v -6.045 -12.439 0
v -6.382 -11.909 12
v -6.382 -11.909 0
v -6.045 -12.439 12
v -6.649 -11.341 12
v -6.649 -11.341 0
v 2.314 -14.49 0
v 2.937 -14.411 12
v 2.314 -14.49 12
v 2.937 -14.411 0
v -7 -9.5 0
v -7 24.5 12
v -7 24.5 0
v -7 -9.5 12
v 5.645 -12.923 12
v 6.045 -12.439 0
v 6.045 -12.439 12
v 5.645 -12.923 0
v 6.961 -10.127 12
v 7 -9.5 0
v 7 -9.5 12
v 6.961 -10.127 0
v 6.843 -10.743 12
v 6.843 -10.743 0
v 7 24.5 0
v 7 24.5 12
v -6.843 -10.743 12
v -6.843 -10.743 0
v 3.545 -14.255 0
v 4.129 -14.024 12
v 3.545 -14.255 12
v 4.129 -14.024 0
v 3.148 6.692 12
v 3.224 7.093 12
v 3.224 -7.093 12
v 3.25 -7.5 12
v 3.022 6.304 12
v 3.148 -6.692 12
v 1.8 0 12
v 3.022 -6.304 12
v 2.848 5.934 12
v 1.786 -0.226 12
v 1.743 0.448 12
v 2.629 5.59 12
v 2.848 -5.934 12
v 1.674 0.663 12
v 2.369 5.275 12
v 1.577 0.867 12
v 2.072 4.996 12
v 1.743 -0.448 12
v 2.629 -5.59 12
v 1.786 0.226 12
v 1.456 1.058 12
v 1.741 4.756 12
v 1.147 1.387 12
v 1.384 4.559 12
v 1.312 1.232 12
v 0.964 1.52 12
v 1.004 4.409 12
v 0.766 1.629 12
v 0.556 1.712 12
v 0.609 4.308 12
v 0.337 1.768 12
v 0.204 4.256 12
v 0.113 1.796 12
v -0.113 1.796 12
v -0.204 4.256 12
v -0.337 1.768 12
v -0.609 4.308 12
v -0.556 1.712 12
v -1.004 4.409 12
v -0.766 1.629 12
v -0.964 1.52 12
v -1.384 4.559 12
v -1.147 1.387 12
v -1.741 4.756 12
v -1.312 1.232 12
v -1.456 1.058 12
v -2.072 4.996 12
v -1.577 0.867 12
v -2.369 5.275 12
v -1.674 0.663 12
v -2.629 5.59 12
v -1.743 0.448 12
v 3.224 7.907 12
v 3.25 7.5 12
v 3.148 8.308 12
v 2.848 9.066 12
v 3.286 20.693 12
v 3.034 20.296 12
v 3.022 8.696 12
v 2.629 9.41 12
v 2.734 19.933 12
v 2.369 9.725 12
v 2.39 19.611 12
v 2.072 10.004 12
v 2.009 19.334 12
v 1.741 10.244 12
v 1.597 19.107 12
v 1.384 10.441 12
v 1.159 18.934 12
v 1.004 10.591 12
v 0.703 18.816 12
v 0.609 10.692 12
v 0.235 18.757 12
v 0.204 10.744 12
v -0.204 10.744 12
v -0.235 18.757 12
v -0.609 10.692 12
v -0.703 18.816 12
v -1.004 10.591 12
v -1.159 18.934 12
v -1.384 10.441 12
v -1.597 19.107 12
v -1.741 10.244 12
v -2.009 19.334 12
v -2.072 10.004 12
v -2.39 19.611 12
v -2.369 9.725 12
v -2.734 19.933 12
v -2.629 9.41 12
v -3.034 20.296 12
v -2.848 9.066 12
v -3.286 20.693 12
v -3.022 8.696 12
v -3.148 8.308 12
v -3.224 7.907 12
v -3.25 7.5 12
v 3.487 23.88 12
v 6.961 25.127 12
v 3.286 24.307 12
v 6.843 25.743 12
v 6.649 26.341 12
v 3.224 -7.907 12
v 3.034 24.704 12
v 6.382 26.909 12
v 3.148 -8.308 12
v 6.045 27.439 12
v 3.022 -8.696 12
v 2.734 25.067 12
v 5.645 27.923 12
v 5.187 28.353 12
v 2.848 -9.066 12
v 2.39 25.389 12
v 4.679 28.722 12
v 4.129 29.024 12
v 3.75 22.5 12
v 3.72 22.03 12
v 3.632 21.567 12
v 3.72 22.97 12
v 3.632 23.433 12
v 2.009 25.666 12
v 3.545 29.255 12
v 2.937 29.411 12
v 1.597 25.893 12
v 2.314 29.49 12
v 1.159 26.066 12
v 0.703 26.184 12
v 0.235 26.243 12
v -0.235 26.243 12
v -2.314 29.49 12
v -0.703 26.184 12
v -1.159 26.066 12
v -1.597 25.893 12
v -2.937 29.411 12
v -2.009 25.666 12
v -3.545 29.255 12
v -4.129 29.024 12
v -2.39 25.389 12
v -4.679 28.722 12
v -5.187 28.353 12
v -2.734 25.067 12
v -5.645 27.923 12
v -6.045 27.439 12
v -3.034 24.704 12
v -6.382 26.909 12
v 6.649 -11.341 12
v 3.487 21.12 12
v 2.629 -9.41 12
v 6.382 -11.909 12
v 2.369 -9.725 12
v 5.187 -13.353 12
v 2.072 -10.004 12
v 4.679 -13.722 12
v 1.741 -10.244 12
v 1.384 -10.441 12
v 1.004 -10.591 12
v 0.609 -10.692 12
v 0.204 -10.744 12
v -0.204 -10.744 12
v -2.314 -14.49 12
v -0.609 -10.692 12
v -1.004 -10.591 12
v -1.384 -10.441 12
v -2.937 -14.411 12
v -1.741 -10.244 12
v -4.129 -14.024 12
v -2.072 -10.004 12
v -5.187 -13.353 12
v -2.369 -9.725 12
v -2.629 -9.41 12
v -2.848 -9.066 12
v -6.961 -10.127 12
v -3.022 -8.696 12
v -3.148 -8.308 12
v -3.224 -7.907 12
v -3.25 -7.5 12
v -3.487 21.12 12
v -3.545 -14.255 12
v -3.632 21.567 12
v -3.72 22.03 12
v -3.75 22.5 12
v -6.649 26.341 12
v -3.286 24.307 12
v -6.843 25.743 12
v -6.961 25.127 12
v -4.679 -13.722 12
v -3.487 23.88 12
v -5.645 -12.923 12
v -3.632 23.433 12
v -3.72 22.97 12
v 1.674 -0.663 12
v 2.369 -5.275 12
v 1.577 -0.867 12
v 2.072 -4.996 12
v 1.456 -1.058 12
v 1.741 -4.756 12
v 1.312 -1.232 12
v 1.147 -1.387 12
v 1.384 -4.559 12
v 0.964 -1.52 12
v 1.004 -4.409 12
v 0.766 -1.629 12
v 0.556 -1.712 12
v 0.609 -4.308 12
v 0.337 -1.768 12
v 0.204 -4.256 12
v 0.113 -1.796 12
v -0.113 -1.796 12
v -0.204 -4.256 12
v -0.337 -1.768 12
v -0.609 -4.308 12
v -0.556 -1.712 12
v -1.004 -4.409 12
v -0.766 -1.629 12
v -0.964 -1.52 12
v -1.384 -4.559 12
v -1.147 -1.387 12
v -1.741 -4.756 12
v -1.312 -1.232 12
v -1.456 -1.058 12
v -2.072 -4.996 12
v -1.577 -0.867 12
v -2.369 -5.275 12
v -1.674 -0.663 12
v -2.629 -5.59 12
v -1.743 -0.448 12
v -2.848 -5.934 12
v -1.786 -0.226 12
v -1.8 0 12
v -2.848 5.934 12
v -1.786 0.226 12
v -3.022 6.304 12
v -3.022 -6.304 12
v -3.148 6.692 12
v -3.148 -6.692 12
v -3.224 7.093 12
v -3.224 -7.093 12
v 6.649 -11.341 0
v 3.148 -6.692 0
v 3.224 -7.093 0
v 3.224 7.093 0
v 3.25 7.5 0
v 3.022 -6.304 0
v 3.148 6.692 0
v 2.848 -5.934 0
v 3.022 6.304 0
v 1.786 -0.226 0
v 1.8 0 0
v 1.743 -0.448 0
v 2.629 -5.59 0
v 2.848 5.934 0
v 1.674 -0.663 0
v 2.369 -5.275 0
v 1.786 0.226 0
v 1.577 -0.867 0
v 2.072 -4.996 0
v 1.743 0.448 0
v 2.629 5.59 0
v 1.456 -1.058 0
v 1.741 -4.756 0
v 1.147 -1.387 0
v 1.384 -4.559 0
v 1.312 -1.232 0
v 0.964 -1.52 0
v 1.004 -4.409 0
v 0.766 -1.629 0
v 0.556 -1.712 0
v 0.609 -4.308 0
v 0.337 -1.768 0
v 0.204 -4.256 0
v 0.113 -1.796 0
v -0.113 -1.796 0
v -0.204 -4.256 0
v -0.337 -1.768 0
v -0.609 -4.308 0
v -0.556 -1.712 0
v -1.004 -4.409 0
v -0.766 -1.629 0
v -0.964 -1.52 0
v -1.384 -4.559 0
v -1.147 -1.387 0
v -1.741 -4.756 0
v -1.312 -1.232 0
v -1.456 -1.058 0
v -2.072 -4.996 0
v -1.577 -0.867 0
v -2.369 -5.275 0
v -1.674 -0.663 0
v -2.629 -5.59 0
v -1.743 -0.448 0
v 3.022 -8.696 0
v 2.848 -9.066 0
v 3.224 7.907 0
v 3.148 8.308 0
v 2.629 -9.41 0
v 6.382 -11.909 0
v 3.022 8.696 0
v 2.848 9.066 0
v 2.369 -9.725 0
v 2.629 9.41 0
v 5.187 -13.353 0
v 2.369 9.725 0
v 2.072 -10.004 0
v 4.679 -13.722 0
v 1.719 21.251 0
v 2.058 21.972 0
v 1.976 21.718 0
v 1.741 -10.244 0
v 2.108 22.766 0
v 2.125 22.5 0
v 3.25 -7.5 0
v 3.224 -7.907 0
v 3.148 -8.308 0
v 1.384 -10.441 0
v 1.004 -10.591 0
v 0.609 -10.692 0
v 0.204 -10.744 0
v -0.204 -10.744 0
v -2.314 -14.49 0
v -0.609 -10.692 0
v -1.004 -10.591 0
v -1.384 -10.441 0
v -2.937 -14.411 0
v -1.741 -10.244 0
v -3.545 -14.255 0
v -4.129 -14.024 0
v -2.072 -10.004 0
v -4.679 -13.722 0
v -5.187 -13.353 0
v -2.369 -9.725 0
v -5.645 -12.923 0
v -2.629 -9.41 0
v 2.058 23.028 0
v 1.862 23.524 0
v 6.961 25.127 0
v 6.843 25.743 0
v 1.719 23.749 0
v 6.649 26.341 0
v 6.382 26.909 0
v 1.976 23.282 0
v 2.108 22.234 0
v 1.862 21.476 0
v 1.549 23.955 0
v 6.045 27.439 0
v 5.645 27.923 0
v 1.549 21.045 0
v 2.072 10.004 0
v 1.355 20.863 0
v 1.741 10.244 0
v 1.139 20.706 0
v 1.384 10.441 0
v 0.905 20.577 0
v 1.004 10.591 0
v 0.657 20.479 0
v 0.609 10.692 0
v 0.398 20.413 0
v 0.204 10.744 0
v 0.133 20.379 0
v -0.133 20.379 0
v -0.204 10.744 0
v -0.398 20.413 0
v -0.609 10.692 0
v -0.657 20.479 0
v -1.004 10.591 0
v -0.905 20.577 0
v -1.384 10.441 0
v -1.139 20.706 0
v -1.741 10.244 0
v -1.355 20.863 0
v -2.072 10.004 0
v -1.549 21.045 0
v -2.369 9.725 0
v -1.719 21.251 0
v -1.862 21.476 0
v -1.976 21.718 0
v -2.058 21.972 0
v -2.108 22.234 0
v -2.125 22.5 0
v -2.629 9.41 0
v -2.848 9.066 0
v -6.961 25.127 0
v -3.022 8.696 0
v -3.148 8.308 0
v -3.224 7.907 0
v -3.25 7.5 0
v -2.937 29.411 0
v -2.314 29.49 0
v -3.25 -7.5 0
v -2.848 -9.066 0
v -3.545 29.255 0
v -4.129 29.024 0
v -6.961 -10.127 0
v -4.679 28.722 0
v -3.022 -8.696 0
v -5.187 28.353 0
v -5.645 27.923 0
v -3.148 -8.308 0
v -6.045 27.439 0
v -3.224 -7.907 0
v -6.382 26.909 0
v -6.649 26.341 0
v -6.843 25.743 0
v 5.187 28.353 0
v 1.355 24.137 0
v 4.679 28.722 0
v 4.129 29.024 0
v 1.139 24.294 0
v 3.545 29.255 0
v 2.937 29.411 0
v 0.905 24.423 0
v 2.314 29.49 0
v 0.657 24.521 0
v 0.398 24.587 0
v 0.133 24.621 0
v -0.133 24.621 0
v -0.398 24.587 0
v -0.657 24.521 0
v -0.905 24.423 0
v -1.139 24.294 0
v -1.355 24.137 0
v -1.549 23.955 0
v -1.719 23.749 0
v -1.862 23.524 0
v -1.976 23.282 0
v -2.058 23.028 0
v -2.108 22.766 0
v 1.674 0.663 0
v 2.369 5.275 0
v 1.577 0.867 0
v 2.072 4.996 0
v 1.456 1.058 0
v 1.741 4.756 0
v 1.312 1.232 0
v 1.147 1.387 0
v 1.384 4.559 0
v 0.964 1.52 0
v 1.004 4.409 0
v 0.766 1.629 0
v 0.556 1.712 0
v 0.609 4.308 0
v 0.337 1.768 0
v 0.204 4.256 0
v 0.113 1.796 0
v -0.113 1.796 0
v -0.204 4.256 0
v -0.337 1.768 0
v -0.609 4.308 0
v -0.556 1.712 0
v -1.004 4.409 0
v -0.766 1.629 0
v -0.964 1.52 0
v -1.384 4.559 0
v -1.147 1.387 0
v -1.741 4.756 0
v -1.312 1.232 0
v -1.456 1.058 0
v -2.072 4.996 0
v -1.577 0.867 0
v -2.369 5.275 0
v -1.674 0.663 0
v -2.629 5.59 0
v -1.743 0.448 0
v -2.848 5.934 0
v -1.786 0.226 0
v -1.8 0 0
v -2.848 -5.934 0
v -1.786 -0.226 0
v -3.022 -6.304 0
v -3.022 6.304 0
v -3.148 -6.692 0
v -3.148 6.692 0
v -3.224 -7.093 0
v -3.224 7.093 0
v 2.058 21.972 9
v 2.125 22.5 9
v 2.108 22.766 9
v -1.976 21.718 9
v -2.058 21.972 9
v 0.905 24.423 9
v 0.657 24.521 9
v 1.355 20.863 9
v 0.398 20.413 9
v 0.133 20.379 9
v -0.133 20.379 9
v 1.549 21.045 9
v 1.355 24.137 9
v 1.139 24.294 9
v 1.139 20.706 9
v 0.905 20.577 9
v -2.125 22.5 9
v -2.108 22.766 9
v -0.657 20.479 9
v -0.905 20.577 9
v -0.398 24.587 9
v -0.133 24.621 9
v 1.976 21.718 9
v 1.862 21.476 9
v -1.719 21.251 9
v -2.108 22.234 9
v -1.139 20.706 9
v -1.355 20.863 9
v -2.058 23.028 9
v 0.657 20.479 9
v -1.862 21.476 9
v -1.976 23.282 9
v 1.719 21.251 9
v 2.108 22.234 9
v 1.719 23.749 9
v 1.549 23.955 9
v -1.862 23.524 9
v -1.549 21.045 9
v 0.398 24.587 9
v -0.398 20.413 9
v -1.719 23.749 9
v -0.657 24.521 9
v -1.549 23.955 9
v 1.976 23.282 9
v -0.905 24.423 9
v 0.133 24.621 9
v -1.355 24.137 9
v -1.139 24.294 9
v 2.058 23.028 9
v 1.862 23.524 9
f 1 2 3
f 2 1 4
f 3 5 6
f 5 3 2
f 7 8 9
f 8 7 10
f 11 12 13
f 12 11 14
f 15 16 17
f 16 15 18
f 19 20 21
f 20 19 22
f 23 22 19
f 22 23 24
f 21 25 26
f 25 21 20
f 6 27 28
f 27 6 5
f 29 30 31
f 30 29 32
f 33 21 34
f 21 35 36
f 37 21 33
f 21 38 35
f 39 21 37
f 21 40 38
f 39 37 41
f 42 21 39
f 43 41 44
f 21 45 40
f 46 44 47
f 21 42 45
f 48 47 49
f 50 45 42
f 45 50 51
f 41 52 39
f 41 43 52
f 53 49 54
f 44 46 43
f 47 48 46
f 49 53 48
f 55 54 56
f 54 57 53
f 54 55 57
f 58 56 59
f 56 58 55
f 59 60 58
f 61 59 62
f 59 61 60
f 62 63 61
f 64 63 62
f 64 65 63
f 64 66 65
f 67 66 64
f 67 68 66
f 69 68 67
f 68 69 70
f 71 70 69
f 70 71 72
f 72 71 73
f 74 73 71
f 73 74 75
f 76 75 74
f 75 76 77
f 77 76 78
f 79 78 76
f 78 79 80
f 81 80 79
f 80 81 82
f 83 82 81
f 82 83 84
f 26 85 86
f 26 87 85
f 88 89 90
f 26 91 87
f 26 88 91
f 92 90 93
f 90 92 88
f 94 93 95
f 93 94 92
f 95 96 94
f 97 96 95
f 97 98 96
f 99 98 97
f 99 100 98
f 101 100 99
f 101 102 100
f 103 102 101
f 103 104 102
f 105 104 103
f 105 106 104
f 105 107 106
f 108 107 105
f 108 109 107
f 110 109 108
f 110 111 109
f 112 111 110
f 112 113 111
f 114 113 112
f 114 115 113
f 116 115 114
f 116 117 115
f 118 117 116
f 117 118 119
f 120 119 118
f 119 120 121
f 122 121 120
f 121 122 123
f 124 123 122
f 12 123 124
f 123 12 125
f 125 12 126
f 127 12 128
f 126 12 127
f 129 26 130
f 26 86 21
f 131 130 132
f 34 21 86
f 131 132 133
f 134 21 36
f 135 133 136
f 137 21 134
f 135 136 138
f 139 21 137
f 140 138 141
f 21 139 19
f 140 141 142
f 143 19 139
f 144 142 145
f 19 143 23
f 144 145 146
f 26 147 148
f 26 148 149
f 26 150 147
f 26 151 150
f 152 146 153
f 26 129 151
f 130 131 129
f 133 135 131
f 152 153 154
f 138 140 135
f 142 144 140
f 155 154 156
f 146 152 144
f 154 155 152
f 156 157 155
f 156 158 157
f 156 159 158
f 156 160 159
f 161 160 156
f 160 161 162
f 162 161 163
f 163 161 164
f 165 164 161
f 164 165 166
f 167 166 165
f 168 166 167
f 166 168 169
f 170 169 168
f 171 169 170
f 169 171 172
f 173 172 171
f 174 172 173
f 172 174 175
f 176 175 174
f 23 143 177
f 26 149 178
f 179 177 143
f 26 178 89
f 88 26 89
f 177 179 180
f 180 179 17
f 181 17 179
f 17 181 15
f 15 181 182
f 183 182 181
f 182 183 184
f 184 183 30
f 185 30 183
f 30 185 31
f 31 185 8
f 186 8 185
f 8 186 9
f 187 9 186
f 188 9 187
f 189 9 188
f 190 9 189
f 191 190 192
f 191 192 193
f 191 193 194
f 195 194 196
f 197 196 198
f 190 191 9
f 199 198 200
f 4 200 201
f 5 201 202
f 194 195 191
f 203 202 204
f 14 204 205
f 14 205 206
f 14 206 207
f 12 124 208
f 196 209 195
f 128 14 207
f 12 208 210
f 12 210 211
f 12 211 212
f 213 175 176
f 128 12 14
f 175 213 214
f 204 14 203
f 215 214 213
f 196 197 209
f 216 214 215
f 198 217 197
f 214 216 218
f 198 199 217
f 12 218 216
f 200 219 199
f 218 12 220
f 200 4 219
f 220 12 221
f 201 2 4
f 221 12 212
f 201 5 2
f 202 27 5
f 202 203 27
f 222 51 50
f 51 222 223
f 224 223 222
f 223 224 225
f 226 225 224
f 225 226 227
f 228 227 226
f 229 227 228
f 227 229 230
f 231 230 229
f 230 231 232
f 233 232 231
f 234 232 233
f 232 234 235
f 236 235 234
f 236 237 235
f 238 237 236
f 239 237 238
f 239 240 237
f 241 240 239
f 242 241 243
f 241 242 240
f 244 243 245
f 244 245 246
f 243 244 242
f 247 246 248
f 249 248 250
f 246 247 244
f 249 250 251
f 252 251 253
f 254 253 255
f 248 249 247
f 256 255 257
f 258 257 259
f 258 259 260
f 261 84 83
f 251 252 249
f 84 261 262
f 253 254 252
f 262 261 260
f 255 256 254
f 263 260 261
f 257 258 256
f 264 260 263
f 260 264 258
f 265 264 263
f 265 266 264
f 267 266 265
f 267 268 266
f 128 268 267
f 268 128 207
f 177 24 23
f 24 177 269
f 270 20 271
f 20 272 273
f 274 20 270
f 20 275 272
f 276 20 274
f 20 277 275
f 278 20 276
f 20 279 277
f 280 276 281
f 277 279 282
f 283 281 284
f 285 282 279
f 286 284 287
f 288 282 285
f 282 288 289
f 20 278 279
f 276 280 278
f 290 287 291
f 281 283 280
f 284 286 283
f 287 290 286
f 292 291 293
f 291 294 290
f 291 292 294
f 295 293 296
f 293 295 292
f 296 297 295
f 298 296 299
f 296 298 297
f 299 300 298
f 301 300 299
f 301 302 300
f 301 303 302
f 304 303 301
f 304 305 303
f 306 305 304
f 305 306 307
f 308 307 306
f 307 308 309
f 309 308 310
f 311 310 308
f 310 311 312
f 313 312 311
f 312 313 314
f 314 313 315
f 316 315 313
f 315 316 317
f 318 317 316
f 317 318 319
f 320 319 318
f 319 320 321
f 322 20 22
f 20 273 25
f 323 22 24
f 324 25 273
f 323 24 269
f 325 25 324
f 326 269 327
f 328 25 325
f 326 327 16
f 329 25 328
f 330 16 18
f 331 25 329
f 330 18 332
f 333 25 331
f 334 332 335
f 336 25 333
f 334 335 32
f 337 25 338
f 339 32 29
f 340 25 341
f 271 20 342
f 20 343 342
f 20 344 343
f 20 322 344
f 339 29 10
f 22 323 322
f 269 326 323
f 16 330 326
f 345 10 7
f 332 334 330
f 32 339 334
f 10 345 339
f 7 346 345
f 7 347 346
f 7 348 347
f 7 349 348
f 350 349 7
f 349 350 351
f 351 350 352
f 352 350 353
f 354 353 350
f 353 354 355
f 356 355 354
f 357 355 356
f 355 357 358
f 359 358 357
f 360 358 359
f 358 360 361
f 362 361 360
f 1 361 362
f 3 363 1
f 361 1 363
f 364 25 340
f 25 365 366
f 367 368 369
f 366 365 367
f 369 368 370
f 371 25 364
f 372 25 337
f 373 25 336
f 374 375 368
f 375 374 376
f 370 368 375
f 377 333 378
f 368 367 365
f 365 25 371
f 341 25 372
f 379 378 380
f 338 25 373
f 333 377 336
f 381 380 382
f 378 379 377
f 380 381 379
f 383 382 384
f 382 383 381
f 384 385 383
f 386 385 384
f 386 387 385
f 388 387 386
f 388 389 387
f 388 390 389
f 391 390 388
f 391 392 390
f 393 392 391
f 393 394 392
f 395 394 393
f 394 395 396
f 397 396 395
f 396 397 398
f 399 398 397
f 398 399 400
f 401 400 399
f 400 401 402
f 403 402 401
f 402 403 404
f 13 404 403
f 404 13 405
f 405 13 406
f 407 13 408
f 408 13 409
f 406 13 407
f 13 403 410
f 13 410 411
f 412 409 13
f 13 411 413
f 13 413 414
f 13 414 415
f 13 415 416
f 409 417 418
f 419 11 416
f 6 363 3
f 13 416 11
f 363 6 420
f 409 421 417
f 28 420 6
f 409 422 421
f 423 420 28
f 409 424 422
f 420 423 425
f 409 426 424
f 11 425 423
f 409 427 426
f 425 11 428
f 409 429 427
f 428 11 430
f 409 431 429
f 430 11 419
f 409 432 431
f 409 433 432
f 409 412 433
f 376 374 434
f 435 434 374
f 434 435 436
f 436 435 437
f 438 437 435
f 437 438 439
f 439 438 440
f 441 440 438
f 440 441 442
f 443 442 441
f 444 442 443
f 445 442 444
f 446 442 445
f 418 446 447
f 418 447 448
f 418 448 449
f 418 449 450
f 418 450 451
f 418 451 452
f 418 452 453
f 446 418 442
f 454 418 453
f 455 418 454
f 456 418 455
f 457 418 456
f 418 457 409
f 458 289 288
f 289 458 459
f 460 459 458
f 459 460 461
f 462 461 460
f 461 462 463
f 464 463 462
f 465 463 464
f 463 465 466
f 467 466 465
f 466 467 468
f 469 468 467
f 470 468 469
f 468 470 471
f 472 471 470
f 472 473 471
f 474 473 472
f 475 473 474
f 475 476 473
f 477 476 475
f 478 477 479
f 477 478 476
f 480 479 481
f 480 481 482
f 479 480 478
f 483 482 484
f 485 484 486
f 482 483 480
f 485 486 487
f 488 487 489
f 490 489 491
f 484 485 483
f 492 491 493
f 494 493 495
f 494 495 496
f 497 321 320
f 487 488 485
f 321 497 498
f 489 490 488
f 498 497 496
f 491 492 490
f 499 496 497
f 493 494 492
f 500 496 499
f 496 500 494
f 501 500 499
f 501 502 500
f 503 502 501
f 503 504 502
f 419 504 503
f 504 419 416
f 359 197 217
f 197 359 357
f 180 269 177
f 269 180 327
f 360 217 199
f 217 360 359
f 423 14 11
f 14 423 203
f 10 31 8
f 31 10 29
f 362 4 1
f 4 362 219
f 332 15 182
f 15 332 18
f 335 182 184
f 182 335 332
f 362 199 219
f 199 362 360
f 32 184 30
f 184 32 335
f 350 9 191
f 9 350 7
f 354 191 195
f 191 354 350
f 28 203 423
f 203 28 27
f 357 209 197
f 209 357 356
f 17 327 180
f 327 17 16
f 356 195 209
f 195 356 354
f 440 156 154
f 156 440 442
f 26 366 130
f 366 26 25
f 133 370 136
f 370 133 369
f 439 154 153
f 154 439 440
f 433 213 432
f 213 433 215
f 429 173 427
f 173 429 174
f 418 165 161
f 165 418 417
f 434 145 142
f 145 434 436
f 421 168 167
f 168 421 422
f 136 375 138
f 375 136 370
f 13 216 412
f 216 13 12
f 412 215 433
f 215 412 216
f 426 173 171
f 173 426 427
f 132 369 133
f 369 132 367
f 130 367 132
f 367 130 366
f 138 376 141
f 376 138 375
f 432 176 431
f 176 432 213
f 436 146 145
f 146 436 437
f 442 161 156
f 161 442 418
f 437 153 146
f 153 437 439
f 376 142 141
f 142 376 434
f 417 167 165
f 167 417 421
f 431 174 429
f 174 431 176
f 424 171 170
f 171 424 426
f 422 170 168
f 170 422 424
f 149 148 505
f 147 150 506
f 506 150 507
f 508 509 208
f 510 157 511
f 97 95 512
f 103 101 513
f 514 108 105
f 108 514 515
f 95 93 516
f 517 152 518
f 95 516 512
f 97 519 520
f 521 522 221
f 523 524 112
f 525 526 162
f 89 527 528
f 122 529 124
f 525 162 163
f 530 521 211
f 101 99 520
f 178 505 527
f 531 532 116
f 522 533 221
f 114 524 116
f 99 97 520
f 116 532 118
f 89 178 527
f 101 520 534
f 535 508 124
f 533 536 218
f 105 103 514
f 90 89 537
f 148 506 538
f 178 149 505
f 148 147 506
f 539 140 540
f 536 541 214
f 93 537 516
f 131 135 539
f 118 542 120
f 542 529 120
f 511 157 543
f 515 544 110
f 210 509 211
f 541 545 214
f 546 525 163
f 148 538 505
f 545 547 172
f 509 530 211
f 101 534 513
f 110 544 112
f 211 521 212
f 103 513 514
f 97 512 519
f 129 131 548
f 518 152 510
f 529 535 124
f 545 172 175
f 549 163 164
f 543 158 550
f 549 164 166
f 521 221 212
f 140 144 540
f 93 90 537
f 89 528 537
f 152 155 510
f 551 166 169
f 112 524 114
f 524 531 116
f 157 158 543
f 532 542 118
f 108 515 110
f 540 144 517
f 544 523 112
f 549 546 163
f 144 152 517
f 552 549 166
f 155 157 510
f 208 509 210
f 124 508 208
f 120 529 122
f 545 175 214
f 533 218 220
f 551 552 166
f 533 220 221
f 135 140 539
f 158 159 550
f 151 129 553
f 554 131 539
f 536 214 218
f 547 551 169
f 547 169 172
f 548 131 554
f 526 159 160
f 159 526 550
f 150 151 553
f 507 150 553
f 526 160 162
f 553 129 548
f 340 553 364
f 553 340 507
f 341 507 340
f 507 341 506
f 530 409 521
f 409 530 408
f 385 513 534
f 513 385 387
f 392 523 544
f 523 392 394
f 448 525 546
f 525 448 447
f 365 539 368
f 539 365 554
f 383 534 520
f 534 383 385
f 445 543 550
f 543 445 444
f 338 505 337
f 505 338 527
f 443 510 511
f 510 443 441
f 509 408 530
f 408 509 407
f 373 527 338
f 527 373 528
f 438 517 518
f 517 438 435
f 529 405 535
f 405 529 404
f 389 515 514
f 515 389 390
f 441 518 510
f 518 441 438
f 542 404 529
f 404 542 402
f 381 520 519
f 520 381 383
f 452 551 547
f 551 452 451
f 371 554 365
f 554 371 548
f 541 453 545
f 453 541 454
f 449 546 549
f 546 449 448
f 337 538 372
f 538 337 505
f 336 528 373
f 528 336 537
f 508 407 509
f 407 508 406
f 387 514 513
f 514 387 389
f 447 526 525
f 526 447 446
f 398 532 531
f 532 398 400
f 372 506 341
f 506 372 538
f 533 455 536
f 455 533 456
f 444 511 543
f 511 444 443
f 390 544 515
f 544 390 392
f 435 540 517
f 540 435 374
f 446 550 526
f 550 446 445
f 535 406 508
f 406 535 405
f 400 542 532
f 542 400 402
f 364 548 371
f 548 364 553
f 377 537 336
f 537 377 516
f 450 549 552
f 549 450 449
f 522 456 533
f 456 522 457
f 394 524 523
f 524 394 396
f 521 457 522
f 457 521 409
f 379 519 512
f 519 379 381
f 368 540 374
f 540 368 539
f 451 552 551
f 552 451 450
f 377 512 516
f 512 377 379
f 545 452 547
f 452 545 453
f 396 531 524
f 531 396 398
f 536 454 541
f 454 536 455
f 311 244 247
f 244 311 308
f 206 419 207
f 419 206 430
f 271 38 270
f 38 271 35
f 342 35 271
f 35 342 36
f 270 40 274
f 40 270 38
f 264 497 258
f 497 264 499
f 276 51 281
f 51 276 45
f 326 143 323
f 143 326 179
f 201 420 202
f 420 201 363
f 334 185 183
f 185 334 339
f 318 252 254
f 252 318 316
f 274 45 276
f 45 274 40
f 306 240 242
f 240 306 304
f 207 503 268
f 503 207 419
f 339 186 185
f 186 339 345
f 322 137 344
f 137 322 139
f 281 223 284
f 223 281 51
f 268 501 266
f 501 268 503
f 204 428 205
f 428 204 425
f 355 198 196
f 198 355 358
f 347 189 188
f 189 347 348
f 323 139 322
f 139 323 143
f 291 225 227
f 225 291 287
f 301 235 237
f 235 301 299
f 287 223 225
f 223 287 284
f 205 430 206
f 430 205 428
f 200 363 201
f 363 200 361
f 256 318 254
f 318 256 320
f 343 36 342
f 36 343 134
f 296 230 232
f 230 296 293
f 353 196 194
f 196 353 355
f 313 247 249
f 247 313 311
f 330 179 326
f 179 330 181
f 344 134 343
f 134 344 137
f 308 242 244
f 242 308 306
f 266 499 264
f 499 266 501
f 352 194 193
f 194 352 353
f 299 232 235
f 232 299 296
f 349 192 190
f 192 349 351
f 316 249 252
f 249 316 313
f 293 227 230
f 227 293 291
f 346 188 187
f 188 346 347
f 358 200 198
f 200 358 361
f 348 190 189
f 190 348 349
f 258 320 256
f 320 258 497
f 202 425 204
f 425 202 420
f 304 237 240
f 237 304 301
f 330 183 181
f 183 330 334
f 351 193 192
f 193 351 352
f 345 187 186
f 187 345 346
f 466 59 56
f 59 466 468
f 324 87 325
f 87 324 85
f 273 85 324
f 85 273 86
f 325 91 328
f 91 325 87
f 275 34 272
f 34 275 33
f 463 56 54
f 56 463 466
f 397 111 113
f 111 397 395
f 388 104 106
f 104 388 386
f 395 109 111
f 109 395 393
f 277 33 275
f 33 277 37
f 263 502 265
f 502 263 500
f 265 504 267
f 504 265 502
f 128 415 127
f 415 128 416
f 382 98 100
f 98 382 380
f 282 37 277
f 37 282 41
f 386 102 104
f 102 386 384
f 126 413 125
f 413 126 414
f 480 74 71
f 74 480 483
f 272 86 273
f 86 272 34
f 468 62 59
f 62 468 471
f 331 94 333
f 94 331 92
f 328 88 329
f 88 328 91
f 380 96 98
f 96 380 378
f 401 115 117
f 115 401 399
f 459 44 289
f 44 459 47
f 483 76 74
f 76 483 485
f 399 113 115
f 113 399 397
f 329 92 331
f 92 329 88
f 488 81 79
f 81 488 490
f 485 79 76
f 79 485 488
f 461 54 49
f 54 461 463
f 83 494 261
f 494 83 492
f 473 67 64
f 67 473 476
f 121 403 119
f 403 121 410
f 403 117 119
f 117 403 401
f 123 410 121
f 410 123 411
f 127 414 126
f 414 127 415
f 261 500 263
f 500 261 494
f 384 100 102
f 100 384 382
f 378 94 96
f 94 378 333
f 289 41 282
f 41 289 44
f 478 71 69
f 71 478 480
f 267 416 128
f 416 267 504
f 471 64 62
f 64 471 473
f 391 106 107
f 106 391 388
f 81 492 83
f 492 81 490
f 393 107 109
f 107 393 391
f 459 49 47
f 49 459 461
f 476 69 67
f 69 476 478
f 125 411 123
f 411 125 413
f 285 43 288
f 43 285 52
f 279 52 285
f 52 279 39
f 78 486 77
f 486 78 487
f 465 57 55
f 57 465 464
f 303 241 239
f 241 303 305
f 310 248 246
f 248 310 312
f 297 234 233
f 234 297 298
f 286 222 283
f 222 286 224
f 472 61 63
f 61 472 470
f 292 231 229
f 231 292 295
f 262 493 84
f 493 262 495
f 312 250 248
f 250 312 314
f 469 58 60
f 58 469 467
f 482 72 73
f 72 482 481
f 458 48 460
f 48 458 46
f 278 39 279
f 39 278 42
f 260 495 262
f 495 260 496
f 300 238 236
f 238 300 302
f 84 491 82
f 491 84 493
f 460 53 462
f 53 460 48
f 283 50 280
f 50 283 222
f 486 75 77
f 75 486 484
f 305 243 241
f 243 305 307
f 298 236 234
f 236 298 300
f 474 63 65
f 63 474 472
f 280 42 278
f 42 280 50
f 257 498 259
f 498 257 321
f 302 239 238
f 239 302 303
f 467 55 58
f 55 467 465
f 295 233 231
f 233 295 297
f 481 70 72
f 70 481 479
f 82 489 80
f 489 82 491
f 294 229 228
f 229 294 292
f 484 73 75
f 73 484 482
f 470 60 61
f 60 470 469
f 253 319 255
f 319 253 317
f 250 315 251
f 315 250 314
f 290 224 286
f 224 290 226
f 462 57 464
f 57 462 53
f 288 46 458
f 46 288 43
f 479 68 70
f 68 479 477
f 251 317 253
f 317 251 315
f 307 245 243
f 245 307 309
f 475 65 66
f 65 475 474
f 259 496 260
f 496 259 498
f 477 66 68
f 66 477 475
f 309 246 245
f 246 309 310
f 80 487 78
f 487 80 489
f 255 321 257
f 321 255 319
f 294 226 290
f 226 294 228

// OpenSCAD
$fn = 50;


difference() {
	union() {
		hull() {
			translate(v = [-2.0000000000, 9.5000000000, 0]) {
				cylinder(h = 12, r = 5);
			}
			translate(v = [2.0000000000, 9.5000000000, 0]) {
				cylinder(h = 12, r = 5);
			}
			translate(v = [-2.0000000000, -9.5000000000, 0]) {
				cylinder(h = 12, r = 5);
			}
			translate(v = [2.0000000000, -9.5000000000, 0]) {
				cylinder(h = 12, r = 5);
			}
		}
		translate(v = [0.0000000000, 15.0000000000, 0]) {
			hull() {
				translate(v = [-2.0000000000, 9.5000000000, 0]) {
					cylinder(h = 12, r = 5);
				}
				translate(v = [2.0000000000, 9.5000000000, 0]) {
					cylinder(h = 12, r = 5);
				}
				translate(v = [-2.0000000000, -9.5000000000, 0]) {
					cylinder(h = 12, r = 5);
				}
				translate(v = [2.0000000000, -9.5000000000, 0]) {
					cylinder(h = 12, r = 5);
				}
			}
		}
		translate(v = [0.0000000000, 15.0000000000, 0]) {
			hull() {
				translate(v = [-2.0000000000, 9.5000000000, 0]) {
					cylinder(h = 12, r = 5);
				}
				translate(v = [2.0000000000, 9.5000000000, 0]) {
					cylinder(h = 12, r = 5);
				}
				translate(v = [-2.0000000000, -9.5000000000, 0]) {
					cylinder(h = 12, r = 5);
				}
				translate(v = [2.0000000000, -9.5000000000, 0]) {
					cylinder(h = 12, r = 5);
				}
			}
		}
	}
	union() {
		translate(v = [0.0000000000, 22.5000000000, 12]) {
			rotate(a = [0, 0, 0]) {
				difference() {
					union() {
						#translate(v = [0, 0, -12.0000000000]) {
							cylinder(h = 12, r = 2.0000000000);
						}
						#translate(v = [0, 0, -3]) {
							cylinder(h = 3, r1 = 2.1250000000, r2 = 3.7500000000);
						}
						#translate(v = [0, 0, -12.0000000000]) {
							cylinder(h = 12, r = 2.1250000000);
						}
						#translate(v = [0, 0, -12.0000000000]) {
							cylinder(h = 12, r = 2.0000000000);
						}
					}
					union();
				}
			}
		}
		translate(v = [0.0000000000, 22.5000000000, 12]) {
			rotate(a = [0, 0, 0]) {
				difference() {
					union() {
						#translate(v = [0, 0, -12.0000000000]) {
							cylinder(h = 12, r = 2.0000000000);
						}
						#translate(v = [0, 0, -3]) {
							cylinder(h = 3, r1 = 2.1250000000, r2 = 3.7500000000);
						}
						#translate(v = [0, 0, -12.0000000000]) {
							cylinder(h = 12, r = 2.1250000000);
						}
						#translate(v = [0, 0, -12.0000000000]) {
							cylinder(h = 12, r = 2.0000000000);
						}
					}
					union();
				}
			}
		}
		translate(v = [0.0000000000, -7.5000000000, 0]) {
			translate(v = [0, 0, -100]) {
				cylinder(h = 200, r = 3.2500000000);
			}
		}
		translate(v = [0.0000000000, 7.5000000000, 0]) {
			translate(v = [0, 0, -100]) {
				cylinder(h = 200, r = 3.2500000000);
			}
		}
		translate(v = [0.0000000000, -7.5000000000, 0]) {
			translate(v = [0, 0, -100]) {
				cylinder(h = 200, r = 1.8000000000);
			}
		}
		translate(v = [0, 0, -100]) {
			cylinder(h = 200, r = 1.8000000000);
		}
		translate(v = [0.0000000000, 7.5000000000, 0]) {
			translate(v = [0, 0, -100]) {
				cylinder(h = 200, r = 1.8000000000);
			}
		}
	}
}
